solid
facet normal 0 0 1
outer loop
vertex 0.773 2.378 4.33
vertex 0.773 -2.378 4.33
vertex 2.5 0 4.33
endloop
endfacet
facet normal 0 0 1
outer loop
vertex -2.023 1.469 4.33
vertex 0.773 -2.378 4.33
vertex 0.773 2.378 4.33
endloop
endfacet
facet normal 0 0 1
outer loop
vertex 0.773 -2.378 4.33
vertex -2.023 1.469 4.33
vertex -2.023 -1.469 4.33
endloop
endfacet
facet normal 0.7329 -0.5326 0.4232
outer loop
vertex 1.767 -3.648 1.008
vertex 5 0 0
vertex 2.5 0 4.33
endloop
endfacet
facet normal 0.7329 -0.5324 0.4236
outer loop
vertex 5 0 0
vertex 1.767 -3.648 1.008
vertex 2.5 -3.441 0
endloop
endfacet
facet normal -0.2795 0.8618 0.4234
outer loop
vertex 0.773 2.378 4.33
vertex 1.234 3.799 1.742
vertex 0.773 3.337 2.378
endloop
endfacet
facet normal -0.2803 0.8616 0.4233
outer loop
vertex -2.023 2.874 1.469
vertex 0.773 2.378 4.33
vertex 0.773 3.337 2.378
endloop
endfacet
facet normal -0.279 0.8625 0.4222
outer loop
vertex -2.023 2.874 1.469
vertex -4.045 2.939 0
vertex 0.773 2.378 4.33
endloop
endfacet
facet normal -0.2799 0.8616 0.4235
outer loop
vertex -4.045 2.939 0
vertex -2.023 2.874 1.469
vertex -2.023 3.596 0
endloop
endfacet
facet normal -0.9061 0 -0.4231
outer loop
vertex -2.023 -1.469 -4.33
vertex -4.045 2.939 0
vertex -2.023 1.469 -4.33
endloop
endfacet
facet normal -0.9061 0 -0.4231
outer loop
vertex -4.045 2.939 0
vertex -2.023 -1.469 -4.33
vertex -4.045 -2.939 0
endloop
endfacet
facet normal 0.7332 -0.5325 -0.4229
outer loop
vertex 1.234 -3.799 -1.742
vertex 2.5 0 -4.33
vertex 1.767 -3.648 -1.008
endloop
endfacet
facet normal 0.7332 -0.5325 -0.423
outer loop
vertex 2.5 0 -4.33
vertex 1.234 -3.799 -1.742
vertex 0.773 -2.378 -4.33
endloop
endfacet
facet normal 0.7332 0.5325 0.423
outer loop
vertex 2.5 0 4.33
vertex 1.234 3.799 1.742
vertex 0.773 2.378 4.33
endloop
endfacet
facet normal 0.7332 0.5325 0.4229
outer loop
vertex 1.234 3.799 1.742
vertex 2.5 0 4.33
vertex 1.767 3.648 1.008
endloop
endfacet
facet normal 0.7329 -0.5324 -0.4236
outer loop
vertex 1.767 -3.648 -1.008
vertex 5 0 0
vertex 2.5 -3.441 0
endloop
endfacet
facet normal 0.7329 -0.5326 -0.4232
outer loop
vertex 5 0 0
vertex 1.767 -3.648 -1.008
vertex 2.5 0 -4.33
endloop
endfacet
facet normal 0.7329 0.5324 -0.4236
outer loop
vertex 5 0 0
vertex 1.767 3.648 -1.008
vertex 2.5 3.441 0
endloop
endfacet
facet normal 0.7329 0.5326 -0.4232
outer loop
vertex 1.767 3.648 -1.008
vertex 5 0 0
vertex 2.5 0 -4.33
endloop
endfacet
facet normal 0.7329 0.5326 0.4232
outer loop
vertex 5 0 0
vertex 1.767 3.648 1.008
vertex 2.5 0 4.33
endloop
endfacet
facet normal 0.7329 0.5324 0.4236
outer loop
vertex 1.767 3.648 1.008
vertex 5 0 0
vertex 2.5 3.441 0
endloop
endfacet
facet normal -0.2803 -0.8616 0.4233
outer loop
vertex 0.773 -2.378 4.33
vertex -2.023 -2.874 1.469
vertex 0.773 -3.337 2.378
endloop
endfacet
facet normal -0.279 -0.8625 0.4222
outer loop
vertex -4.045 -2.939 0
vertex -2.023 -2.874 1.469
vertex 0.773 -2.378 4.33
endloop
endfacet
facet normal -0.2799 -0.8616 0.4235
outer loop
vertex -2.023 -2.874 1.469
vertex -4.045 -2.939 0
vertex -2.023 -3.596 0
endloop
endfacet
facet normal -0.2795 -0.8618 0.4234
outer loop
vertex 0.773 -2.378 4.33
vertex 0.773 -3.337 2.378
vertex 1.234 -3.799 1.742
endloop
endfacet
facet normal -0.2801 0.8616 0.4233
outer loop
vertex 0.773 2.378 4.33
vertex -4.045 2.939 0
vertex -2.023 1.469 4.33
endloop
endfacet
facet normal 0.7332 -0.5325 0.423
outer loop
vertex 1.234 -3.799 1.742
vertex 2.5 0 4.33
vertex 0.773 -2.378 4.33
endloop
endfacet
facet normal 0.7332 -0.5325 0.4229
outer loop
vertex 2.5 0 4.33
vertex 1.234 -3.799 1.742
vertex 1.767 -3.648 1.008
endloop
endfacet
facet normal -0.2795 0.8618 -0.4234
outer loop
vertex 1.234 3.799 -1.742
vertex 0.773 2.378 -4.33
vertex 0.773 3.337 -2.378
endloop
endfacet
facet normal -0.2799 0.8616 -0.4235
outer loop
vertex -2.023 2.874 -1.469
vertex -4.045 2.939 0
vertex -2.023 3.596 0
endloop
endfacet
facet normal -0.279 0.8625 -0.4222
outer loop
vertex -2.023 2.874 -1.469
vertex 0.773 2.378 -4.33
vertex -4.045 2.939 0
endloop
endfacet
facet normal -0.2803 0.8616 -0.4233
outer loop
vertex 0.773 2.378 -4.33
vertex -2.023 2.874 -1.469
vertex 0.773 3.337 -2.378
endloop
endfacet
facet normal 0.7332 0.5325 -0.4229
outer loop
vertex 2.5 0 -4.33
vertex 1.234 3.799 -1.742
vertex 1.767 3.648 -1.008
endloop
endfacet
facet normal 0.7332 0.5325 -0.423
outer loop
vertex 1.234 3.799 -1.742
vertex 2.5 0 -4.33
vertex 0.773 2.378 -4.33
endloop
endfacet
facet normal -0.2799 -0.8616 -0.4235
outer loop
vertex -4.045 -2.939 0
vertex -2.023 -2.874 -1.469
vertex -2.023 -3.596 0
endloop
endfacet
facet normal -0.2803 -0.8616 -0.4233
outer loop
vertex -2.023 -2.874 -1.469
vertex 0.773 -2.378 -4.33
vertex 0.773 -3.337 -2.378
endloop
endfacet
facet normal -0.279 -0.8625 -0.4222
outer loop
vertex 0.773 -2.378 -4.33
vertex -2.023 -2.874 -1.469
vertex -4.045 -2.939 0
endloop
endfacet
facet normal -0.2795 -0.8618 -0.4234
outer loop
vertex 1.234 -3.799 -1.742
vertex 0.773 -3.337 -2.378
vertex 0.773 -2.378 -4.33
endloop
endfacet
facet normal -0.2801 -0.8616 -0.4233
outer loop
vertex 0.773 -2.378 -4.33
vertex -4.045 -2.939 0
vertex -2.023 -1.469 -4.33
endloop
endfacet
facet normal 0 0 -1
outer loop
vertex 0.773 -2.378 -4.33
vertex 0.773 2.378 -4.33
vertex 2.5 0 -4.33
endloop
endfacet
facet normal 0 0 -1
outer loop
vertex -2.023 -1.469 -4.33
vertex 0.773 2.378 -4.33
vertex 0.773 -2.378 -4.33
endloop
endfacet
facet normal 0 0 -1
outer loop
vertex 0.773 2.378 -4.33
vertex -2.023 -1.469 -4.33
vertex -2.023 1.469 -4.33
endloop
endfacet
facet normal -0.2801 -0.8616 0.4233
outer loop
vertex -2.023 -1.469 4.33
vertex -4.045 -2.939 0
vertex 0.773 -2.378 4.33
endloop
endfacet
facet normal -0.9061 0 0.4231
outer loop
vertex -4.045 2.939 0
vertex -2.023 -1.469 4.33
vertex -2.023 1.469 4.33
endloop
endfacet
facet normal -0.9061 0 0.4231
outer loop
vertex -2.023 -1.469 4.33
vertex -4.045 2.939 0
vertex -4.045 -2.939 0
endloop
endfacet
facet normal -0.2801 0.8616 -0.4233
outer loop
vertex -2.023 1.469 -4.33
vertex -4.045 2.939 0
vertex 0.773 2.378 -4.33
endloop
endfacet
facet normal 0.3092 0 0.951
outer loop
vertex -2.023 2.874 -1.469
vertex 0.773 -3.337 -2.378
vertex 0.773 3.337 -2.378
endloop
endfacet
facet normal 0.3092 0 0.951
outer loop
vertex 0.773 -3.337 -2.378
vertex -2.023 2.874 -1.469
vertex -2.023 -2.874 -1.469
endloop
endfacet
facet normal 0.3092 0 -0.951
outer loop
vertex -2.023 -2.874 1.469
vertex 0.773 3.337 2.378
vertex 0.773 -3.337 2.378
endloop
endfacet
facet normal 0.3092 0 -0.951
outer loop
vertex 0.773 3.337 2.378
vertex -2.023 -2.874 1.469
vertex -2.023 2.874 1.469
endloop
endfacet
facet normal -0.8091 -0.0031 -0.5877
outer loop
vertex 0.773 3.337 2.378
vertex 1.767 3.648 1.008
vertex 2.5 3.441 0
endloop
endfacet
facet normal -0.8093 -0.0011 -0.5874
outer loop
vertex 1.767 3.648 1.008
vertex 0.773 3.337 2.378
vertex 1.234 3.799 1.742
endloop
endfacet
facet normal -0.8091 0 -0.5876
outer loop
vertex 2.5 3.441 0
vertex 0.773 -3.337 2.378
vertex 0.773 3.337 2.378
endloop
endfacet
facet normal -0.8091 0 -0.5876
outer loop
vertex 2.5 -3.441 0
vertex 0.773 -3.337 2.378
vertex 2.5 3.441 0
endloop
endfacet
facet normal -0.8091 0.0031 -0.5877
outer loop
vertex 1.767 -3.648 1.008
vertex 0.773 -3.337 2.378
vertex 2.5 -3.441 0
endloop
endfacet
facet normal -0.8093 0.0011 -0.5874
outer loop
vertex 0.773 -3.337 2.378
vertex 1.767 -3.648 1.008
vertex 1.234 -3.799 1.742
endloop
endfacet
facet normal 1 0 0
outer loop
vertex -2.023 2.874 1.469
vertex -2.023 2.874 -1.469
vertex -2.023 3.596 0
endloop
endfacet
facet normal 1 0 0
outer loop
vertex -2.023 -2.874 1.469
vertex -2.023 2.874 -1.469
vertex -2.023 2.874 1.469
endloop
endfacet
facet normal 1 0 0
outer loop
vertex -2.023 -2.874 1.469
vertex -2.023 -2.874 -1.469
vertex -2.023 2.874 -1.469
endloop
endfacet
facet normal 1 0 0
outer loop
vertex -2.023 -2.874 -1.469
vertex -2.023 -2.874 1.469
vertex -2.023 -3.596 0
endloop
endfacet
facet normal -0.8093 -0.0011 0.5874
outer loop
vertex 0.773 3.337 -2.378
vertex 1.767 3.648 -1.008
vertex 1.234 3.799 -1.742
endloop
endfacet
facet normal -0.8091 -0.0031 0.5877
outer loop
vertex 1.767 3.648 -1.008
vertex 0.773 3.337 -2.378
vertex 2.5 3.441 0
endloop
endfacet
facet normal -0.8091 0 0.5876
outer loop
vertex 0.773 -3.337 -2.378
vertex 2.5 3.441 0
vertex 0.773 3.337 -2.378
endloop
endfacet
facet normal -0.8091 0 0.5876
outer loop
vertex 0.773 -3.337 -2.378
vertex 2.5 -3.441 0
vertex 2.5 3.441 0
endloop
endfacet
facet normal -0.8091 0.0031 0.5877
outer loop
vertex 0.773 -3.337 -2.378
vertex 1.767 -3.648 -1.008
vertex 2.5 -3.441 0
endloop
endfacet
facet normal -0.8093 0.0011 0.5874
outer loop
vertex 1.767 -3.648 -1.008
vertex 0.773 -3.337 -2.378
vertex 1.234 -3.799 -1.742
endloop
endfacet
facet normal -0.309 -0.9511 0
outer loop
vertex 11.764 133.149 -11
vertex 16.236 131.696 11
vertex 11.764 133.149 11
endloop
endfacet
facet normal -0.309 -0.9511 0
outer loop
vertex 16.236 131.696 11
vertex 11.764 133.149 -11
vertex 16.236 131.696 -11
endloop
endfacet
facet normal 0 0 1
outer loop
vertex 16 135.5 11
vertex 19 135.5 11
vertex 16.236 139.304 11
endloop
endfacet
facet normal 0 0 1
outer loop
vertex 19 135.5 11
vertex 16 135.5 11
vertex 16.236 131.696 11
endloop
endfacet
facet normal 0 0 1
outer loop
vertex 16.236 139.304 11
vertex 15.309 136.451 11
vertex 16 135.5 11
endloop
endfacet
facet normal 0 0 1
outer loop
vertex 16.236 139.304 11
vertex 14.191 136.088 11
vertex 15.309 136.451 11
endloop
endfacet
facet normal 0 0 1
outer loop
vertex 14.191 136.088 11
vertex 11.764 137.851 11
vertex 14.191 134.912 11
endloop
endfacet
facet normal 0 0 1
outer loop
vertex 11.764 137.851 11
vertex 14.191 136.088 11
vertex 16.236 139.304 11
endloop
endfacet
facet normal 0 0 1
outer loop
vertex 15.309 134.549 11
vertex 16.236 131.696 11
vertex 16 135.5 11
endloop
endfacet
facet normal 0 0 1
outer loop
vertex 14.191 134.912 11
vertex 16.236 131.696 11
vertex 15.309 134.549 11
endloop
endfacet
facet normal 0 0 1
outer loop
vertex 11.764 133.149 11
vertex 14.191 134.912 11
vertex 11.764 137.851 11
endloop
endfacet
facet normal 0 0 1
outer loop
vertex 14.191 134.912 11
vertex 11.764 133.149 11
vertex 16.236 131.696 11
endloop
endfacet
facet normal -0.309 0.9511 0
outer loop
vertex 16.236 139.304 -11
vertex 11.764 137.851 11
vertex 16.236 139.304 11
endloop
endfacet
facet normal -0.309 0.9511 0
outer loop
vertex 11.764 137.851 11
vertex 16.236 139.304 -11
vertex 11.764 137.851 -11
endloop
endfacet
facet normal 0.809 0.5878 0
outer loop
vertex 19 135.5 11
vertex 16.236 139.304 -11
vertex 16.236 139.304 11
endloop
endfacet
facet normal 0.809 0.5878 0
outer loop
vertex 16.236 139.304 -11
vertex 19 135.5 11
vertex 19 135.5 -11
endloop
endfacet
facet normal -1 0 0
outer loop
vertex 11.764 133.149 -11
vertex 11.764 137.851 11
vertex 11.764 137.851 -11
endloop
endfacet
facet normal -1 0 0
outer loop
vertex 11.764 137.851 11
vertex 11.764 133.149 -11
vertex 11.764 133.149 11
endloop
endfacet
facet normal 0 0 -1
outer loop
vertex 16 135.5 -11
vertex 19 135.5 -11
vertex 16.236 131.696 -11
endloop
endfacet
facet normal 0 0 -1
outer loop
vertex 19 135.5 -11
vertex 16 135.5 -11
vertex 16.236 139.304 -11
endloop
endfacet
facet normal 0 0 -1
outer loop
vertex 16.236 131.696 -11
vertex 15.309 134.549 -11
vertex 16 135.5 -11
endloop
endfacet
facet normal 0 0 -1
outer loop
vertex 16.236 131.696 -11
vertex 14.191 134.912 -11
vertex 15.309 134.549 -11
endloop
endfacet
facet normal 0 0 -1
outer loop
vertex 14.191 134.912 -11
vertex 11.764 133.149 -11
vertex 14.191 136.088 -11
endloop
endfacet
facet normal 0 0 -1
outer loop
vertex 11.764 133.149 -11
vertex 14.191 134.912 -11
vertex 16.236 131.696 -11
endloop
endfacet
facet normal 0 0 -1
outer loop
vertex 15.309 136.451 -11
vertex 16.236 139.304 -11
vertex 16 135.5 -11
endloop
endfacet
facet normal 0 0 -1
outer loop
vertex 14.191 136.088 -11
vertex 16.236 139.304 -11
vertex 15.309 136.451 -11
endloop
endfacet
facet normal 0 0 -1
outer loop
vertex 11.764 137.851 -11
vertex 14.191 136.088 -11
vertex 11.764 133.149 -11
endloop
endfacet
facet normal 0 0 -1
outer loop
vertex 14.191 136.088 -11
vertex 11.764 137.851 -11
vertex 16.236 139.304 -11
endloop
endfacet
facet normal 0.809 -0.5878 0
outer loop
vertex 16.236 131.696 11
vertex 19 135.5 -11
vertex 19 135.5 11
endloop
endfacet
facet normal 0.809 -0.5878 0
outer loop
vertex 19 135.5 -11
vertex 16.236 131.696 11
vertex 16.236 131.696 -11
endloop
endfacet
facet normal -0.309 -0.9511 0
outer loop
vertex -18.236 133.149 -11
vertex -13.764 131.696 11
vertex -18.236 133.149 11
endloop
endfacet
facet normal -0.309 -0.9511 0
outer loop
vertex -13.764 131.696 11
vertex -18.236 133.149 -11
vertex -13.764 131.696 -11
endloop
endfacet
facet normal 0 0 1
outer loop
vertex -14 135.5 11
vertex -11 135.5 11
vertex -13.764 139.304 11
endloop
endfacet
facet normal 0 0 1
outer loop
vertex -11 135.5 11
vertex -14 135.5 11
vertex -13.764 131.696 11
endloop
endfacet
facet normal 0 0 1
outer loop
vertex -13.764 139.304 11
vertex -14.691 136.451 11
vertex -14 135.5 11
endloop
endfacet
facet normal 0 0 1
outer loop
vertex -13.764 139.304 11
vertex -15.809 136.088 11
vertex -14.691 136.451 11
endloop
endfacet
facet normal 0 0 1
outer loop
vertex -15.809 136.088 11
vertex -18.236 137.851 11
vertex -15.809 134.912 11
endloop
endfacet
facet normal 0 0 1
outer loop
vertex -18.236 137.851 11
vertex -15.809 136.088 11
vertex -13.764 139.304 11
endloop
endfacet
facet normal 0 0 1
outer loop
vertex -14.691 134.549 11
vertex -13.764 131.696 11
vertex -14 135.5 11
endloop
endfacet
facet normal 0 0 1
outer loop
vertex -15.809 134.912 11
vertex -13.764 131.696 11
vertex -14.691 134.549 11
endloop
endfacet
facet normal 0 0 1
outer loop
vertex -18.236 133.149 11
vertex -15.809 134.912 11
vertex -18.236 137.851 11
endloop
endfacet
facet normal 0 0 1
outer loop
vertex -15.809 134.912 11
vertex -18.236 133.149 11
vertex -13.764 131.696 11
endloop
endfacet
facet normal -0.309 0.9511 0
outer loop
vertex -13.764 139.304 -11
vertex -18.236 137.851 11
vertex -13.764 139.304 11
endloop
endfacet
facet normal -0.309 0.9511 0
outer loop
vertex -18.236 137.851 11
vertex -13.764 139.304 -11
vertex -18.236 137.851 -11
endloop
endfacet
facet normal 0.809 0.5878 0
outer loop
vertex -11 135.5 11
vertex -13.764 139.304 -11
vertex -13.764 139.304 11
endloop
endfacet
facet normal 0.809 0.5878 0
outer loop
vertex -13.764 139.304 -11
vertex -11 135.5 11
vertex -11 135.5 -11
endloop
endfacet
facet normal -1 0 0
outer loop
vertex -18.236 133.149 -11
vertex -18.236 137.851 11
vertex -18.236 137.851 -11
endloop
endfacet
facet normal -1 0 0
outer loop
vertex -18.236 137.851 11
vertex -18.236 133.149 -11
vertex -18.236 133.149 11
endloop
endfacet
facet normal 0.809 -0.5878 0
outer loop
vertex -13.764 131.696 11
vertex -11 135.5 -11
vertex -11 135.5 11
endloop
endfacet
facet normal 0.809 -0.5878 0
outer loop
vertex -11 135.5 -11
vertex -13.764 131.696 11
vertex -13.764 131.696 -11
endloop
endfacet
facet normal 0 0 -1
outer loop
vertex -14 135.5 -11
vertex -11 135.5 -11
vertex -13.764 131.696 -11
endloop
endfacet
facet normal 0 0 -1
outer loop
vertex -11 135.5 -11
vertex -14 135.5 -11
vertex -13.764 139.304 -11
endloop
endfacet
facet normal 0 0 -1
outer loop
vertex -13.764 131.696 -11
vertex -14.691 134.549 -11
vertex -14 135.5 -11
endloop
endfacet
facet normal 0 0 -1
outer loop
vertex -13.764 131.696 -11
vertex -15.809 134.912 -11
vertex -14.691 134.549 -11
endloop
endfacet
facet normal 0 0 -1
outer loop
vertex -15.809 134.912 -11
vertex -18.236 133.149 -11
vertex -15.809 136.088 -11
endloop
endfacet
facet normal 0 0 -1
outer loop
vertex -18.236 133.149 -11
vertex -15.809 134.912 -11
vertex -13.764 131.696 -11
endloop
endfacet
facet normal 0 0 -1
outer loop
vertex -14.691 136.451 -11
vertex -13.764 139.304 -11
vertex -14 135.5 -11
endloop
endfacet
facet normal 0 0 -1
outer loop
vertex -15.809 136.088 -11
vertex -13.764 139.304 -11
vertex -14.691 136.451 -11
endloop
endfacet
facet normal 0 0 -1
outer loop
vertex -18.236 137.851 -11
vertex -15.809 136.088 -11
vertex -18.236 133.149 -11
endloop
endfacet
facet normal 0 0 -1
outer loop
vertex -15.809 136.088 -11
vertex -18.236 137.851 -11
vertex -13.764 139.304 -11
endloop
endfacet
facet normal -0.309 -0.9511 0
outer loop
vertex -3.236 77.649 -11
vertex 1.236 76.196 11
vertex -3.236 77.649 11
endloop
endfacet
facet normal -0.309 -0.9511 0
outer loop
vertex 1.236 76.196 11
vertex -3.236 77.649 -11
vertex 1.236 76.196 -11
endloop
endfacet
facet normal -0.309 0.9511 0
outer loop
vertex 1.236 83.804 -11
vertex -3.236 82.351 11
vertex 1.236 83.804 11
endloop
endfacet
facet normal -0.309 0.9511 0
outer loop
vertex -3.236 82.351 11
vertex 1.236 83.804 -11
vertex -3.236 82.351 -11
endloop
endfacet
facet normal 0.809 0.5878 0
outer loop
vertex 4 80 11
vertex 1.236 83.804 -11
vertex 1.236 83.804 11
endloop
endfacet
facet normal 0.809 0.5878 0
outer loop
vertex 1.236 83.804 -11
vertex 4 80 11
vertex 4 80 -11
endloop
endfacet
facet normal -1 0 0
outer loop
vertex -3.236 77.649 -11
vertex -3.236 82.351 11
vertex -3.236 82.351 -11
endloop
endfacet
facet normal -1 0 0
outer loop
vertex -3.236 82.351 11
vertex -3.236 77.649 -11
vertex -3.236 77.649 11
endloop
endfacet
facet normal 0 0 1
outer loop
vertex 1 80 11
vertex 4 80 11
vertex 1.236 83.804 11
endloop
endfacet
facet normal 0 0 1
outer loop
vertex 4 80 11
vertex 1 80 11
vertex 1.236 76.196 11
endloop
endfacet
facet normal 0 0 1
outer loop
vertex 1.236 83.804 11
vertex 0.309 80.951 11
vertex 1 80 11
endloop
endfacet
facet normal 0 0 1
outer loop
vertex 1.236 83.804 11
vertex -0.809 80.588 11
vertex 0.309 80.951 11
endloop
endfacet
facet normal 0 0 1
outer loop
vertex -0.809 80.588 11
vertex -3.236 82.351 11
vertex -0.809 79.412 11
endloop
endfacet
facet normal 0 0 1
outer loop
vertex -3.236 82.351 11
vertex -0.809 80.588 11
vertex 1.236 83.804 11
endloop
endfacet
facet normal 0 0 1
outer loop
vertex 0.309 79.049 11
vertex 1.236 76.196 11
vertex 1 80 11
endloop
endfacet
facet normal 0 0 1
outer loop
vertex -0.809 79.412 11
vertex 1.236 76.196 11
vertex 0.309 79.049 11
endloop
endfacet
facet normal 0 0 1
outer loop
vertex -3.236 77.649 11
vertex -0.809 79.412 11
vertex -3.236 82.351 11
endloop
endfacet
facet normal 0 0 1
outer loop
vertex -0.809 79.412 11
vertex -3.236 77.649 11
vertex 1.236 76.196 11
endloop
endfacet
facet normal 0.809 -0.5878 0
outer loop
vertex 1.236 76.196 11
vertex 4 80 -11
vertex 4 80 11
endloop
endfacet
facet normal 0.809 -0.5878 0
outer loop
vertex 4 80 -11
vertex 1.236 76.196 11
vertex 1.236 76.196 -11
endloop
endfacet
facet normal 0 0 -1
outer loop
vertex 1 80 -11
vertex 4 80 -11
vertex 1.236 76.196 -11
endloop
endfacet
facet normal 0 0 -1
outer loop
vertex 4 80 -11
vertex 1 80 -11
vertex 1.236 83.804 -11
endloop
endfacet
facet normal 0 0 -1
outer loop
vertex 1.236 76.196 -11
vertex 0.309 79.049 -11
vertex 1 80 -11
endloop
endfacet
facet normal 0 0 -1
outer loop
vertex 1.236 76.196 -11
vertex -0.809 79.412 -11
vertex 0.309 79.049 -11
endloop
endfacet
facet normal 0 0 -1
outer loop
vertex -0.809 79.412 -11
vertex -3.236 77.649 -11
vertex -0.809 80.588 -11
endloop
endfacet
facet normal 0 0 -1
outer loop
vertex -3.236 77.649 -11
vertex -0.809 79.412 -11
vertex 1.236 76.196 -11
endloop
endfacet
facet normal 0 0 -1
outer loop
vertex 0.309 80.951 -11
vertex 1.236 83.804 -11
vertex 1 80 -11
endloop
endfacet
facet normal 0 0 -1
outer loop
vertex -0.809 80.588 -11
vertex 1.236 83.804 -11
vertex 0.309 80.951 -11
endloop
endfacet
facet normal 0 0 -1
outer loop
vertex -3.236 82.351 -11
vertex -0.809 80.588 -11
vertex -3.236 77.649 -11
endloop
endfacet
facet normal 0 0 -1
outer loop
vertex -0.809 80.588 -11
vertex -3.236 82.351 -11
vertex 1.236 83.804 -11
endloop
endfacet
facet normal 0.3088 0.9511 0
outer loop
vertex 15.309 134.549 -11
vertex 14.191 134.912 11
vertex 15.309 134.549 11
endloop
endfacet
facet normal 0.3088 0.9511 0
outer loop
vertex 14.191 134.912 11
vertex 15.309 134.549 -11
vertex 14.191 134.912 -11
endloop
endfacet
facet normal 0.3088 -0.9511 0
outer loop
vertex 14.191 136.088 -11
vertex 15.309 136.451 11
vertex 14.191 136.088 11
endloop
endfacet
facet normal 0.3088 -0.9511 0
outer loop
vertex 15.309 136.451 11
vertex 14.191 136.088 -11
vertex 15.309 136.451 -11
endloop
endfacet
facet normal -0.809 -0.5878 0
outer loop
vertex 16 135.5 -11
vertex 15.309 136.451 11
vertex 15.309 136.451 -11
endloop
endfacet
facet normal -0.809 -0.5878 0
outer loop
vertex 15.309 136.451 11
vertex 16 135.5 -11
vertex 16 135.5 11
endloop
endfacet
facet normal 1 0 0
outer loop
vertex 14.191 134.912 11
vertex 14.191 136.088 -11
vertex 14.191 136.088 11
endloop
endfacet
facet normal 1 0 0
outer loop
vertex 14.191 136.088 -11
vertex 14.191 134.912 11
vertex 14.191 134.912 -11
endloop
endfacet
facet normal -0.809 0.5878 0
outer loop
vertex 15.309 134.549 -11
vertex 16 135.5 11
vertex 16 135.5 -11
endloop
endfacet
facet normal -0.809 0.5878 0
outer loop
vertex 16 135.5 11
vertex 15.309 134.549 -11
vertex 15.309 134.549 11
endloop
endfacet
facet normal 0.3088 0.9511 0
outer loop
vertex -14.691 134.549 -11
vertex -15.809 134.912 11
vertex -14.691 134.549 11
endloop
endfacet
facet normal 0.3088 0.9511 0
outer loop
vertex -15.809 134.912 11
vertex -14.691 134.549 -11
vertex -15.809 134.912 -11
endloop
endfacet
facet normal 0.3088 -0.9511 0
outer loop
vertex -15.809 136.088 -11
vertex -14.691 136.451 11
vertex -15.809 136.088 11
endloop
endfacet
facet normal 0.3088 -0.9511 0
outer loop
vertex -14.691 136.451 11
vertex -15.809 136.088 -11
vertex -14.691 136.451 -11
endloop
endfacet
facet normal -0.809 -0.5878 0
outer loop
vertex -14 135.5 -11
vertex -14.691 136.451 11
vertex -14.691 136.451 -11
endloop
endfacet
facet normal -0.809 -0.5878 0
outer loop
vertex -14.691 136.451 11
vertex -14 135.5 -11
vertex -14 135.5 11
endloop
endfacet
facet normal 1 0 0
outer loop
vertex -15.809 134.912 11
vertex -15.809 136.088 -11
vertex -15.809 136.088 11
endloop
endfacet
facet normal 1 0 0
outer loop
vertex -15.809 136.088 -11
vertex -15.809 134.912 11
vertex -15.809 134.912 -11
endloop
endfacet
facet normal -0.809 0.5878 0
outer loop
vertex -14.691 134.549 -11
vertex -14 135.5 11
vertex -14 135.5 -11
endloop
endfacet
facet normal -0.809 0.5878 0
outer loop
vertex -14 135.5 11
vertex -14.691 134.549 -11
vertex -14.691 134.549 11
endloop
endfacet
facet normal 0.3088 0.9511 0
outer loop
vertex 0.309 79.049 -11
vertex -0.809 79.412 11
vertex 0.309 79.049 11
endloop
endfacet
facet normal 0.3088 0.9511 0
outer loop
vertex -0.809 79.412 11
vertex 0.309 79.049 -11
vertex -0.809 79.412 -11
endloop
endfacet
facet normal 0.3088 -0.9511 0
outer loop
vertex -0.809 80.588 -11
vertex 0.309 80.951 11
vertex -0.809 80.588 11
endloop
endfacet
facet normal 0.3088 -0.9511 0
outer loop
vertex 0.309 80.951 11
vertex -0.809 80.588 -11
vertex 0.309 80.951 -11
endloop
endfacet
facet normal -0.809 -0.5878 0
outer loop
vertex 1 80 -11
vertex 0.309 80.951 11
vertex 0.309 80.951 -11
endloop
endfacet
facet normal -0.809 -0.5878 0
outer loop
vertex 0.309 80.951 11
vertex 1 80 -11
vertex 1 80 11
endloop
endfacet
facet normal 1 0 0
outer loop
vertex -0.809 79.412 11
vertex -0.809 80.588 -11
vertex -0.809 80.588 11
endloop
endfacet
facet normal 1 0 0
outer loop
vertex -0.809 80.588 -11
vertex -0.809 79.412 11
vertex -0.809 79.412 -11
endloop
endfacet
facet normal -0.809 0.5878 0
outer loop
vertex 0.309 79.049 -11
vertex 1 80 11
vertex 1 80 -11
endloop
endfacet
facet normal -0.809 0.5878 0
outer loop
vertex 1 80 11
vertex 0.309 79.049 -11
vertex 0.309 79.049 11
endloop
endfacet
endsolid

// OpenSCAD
// file: M2_holes.scad
module M2(x,y){
translate([x,y,0])
	union(){
		translate([0,0,0]) cylinder(h=30,r=1,center=true);
		translate([0,0,12.5]) cylinder(h=15,r=3);
		translate([0,0,-12.5]) rotate([180,0,0])cylinder(h=15,r=3);
	}

}
// main file
include <M2_holes.scad>
$fn = 5;

// Make the bolts distribute symmetrically autmatically
module M2_2(x,y)
{
	M2(x,y);
	M2(-x,y);
}

// Make the bolts distribute symmetrically autmatically
module poles(x,y)
{
	translate([x,y,0]) cylinder(h = 22, r = 4, center = true);
	translate([-x,y,0]) cylinder(h = 22, r = 4, center = true);

}

// Define the usb rfid reader
module reader(scale)
{
	union(){
		cube([55,11,23],center=true);
		translate([25,0,0])cube([55,7,15],center=true);
	}
}

difference(){
	union(){
		difference(){
			minkowski(){
              // Traced probe, extrude
				linear_extrude(height = 20, center = true) import_dxf(file = "drawing.dxf");
				sphere(5);
			}
			translate([0,0,12.5]) linear_extrude(height = 20) import_dxf(file = "logo.dxf");
			linear_extrude(height = 20, center = true) import_dxf(file = "drawing.dxf");
          // Hole near base for USB cable inlet
			rotate([90,0,0]) cylinder(r=2.5, h=20, center = true);
          // Hole near head for USB cable outlet
			translate([56,120,0]) rotate([0,90,0]) cylinder(r=2.5, h=20, center = true);


			translate([75,160,0]) cube([25,40,15], center = true);
		
			// Fastener holes
			M2_2(18,2);
			M2_2(31,40);
			M2_2(34,86);
			M2_2(56.5,110);
			M2_2(42,140);
		
			
			translate([0,145,0]) reader(1);
		  // translate([-80,0,0]) cube([160,160,50]);
		}
		   poles(15,135.5);
		   poles(0,80);
		
		}
   M2_2(15,135.5);
   M2_2(0,80);
}
